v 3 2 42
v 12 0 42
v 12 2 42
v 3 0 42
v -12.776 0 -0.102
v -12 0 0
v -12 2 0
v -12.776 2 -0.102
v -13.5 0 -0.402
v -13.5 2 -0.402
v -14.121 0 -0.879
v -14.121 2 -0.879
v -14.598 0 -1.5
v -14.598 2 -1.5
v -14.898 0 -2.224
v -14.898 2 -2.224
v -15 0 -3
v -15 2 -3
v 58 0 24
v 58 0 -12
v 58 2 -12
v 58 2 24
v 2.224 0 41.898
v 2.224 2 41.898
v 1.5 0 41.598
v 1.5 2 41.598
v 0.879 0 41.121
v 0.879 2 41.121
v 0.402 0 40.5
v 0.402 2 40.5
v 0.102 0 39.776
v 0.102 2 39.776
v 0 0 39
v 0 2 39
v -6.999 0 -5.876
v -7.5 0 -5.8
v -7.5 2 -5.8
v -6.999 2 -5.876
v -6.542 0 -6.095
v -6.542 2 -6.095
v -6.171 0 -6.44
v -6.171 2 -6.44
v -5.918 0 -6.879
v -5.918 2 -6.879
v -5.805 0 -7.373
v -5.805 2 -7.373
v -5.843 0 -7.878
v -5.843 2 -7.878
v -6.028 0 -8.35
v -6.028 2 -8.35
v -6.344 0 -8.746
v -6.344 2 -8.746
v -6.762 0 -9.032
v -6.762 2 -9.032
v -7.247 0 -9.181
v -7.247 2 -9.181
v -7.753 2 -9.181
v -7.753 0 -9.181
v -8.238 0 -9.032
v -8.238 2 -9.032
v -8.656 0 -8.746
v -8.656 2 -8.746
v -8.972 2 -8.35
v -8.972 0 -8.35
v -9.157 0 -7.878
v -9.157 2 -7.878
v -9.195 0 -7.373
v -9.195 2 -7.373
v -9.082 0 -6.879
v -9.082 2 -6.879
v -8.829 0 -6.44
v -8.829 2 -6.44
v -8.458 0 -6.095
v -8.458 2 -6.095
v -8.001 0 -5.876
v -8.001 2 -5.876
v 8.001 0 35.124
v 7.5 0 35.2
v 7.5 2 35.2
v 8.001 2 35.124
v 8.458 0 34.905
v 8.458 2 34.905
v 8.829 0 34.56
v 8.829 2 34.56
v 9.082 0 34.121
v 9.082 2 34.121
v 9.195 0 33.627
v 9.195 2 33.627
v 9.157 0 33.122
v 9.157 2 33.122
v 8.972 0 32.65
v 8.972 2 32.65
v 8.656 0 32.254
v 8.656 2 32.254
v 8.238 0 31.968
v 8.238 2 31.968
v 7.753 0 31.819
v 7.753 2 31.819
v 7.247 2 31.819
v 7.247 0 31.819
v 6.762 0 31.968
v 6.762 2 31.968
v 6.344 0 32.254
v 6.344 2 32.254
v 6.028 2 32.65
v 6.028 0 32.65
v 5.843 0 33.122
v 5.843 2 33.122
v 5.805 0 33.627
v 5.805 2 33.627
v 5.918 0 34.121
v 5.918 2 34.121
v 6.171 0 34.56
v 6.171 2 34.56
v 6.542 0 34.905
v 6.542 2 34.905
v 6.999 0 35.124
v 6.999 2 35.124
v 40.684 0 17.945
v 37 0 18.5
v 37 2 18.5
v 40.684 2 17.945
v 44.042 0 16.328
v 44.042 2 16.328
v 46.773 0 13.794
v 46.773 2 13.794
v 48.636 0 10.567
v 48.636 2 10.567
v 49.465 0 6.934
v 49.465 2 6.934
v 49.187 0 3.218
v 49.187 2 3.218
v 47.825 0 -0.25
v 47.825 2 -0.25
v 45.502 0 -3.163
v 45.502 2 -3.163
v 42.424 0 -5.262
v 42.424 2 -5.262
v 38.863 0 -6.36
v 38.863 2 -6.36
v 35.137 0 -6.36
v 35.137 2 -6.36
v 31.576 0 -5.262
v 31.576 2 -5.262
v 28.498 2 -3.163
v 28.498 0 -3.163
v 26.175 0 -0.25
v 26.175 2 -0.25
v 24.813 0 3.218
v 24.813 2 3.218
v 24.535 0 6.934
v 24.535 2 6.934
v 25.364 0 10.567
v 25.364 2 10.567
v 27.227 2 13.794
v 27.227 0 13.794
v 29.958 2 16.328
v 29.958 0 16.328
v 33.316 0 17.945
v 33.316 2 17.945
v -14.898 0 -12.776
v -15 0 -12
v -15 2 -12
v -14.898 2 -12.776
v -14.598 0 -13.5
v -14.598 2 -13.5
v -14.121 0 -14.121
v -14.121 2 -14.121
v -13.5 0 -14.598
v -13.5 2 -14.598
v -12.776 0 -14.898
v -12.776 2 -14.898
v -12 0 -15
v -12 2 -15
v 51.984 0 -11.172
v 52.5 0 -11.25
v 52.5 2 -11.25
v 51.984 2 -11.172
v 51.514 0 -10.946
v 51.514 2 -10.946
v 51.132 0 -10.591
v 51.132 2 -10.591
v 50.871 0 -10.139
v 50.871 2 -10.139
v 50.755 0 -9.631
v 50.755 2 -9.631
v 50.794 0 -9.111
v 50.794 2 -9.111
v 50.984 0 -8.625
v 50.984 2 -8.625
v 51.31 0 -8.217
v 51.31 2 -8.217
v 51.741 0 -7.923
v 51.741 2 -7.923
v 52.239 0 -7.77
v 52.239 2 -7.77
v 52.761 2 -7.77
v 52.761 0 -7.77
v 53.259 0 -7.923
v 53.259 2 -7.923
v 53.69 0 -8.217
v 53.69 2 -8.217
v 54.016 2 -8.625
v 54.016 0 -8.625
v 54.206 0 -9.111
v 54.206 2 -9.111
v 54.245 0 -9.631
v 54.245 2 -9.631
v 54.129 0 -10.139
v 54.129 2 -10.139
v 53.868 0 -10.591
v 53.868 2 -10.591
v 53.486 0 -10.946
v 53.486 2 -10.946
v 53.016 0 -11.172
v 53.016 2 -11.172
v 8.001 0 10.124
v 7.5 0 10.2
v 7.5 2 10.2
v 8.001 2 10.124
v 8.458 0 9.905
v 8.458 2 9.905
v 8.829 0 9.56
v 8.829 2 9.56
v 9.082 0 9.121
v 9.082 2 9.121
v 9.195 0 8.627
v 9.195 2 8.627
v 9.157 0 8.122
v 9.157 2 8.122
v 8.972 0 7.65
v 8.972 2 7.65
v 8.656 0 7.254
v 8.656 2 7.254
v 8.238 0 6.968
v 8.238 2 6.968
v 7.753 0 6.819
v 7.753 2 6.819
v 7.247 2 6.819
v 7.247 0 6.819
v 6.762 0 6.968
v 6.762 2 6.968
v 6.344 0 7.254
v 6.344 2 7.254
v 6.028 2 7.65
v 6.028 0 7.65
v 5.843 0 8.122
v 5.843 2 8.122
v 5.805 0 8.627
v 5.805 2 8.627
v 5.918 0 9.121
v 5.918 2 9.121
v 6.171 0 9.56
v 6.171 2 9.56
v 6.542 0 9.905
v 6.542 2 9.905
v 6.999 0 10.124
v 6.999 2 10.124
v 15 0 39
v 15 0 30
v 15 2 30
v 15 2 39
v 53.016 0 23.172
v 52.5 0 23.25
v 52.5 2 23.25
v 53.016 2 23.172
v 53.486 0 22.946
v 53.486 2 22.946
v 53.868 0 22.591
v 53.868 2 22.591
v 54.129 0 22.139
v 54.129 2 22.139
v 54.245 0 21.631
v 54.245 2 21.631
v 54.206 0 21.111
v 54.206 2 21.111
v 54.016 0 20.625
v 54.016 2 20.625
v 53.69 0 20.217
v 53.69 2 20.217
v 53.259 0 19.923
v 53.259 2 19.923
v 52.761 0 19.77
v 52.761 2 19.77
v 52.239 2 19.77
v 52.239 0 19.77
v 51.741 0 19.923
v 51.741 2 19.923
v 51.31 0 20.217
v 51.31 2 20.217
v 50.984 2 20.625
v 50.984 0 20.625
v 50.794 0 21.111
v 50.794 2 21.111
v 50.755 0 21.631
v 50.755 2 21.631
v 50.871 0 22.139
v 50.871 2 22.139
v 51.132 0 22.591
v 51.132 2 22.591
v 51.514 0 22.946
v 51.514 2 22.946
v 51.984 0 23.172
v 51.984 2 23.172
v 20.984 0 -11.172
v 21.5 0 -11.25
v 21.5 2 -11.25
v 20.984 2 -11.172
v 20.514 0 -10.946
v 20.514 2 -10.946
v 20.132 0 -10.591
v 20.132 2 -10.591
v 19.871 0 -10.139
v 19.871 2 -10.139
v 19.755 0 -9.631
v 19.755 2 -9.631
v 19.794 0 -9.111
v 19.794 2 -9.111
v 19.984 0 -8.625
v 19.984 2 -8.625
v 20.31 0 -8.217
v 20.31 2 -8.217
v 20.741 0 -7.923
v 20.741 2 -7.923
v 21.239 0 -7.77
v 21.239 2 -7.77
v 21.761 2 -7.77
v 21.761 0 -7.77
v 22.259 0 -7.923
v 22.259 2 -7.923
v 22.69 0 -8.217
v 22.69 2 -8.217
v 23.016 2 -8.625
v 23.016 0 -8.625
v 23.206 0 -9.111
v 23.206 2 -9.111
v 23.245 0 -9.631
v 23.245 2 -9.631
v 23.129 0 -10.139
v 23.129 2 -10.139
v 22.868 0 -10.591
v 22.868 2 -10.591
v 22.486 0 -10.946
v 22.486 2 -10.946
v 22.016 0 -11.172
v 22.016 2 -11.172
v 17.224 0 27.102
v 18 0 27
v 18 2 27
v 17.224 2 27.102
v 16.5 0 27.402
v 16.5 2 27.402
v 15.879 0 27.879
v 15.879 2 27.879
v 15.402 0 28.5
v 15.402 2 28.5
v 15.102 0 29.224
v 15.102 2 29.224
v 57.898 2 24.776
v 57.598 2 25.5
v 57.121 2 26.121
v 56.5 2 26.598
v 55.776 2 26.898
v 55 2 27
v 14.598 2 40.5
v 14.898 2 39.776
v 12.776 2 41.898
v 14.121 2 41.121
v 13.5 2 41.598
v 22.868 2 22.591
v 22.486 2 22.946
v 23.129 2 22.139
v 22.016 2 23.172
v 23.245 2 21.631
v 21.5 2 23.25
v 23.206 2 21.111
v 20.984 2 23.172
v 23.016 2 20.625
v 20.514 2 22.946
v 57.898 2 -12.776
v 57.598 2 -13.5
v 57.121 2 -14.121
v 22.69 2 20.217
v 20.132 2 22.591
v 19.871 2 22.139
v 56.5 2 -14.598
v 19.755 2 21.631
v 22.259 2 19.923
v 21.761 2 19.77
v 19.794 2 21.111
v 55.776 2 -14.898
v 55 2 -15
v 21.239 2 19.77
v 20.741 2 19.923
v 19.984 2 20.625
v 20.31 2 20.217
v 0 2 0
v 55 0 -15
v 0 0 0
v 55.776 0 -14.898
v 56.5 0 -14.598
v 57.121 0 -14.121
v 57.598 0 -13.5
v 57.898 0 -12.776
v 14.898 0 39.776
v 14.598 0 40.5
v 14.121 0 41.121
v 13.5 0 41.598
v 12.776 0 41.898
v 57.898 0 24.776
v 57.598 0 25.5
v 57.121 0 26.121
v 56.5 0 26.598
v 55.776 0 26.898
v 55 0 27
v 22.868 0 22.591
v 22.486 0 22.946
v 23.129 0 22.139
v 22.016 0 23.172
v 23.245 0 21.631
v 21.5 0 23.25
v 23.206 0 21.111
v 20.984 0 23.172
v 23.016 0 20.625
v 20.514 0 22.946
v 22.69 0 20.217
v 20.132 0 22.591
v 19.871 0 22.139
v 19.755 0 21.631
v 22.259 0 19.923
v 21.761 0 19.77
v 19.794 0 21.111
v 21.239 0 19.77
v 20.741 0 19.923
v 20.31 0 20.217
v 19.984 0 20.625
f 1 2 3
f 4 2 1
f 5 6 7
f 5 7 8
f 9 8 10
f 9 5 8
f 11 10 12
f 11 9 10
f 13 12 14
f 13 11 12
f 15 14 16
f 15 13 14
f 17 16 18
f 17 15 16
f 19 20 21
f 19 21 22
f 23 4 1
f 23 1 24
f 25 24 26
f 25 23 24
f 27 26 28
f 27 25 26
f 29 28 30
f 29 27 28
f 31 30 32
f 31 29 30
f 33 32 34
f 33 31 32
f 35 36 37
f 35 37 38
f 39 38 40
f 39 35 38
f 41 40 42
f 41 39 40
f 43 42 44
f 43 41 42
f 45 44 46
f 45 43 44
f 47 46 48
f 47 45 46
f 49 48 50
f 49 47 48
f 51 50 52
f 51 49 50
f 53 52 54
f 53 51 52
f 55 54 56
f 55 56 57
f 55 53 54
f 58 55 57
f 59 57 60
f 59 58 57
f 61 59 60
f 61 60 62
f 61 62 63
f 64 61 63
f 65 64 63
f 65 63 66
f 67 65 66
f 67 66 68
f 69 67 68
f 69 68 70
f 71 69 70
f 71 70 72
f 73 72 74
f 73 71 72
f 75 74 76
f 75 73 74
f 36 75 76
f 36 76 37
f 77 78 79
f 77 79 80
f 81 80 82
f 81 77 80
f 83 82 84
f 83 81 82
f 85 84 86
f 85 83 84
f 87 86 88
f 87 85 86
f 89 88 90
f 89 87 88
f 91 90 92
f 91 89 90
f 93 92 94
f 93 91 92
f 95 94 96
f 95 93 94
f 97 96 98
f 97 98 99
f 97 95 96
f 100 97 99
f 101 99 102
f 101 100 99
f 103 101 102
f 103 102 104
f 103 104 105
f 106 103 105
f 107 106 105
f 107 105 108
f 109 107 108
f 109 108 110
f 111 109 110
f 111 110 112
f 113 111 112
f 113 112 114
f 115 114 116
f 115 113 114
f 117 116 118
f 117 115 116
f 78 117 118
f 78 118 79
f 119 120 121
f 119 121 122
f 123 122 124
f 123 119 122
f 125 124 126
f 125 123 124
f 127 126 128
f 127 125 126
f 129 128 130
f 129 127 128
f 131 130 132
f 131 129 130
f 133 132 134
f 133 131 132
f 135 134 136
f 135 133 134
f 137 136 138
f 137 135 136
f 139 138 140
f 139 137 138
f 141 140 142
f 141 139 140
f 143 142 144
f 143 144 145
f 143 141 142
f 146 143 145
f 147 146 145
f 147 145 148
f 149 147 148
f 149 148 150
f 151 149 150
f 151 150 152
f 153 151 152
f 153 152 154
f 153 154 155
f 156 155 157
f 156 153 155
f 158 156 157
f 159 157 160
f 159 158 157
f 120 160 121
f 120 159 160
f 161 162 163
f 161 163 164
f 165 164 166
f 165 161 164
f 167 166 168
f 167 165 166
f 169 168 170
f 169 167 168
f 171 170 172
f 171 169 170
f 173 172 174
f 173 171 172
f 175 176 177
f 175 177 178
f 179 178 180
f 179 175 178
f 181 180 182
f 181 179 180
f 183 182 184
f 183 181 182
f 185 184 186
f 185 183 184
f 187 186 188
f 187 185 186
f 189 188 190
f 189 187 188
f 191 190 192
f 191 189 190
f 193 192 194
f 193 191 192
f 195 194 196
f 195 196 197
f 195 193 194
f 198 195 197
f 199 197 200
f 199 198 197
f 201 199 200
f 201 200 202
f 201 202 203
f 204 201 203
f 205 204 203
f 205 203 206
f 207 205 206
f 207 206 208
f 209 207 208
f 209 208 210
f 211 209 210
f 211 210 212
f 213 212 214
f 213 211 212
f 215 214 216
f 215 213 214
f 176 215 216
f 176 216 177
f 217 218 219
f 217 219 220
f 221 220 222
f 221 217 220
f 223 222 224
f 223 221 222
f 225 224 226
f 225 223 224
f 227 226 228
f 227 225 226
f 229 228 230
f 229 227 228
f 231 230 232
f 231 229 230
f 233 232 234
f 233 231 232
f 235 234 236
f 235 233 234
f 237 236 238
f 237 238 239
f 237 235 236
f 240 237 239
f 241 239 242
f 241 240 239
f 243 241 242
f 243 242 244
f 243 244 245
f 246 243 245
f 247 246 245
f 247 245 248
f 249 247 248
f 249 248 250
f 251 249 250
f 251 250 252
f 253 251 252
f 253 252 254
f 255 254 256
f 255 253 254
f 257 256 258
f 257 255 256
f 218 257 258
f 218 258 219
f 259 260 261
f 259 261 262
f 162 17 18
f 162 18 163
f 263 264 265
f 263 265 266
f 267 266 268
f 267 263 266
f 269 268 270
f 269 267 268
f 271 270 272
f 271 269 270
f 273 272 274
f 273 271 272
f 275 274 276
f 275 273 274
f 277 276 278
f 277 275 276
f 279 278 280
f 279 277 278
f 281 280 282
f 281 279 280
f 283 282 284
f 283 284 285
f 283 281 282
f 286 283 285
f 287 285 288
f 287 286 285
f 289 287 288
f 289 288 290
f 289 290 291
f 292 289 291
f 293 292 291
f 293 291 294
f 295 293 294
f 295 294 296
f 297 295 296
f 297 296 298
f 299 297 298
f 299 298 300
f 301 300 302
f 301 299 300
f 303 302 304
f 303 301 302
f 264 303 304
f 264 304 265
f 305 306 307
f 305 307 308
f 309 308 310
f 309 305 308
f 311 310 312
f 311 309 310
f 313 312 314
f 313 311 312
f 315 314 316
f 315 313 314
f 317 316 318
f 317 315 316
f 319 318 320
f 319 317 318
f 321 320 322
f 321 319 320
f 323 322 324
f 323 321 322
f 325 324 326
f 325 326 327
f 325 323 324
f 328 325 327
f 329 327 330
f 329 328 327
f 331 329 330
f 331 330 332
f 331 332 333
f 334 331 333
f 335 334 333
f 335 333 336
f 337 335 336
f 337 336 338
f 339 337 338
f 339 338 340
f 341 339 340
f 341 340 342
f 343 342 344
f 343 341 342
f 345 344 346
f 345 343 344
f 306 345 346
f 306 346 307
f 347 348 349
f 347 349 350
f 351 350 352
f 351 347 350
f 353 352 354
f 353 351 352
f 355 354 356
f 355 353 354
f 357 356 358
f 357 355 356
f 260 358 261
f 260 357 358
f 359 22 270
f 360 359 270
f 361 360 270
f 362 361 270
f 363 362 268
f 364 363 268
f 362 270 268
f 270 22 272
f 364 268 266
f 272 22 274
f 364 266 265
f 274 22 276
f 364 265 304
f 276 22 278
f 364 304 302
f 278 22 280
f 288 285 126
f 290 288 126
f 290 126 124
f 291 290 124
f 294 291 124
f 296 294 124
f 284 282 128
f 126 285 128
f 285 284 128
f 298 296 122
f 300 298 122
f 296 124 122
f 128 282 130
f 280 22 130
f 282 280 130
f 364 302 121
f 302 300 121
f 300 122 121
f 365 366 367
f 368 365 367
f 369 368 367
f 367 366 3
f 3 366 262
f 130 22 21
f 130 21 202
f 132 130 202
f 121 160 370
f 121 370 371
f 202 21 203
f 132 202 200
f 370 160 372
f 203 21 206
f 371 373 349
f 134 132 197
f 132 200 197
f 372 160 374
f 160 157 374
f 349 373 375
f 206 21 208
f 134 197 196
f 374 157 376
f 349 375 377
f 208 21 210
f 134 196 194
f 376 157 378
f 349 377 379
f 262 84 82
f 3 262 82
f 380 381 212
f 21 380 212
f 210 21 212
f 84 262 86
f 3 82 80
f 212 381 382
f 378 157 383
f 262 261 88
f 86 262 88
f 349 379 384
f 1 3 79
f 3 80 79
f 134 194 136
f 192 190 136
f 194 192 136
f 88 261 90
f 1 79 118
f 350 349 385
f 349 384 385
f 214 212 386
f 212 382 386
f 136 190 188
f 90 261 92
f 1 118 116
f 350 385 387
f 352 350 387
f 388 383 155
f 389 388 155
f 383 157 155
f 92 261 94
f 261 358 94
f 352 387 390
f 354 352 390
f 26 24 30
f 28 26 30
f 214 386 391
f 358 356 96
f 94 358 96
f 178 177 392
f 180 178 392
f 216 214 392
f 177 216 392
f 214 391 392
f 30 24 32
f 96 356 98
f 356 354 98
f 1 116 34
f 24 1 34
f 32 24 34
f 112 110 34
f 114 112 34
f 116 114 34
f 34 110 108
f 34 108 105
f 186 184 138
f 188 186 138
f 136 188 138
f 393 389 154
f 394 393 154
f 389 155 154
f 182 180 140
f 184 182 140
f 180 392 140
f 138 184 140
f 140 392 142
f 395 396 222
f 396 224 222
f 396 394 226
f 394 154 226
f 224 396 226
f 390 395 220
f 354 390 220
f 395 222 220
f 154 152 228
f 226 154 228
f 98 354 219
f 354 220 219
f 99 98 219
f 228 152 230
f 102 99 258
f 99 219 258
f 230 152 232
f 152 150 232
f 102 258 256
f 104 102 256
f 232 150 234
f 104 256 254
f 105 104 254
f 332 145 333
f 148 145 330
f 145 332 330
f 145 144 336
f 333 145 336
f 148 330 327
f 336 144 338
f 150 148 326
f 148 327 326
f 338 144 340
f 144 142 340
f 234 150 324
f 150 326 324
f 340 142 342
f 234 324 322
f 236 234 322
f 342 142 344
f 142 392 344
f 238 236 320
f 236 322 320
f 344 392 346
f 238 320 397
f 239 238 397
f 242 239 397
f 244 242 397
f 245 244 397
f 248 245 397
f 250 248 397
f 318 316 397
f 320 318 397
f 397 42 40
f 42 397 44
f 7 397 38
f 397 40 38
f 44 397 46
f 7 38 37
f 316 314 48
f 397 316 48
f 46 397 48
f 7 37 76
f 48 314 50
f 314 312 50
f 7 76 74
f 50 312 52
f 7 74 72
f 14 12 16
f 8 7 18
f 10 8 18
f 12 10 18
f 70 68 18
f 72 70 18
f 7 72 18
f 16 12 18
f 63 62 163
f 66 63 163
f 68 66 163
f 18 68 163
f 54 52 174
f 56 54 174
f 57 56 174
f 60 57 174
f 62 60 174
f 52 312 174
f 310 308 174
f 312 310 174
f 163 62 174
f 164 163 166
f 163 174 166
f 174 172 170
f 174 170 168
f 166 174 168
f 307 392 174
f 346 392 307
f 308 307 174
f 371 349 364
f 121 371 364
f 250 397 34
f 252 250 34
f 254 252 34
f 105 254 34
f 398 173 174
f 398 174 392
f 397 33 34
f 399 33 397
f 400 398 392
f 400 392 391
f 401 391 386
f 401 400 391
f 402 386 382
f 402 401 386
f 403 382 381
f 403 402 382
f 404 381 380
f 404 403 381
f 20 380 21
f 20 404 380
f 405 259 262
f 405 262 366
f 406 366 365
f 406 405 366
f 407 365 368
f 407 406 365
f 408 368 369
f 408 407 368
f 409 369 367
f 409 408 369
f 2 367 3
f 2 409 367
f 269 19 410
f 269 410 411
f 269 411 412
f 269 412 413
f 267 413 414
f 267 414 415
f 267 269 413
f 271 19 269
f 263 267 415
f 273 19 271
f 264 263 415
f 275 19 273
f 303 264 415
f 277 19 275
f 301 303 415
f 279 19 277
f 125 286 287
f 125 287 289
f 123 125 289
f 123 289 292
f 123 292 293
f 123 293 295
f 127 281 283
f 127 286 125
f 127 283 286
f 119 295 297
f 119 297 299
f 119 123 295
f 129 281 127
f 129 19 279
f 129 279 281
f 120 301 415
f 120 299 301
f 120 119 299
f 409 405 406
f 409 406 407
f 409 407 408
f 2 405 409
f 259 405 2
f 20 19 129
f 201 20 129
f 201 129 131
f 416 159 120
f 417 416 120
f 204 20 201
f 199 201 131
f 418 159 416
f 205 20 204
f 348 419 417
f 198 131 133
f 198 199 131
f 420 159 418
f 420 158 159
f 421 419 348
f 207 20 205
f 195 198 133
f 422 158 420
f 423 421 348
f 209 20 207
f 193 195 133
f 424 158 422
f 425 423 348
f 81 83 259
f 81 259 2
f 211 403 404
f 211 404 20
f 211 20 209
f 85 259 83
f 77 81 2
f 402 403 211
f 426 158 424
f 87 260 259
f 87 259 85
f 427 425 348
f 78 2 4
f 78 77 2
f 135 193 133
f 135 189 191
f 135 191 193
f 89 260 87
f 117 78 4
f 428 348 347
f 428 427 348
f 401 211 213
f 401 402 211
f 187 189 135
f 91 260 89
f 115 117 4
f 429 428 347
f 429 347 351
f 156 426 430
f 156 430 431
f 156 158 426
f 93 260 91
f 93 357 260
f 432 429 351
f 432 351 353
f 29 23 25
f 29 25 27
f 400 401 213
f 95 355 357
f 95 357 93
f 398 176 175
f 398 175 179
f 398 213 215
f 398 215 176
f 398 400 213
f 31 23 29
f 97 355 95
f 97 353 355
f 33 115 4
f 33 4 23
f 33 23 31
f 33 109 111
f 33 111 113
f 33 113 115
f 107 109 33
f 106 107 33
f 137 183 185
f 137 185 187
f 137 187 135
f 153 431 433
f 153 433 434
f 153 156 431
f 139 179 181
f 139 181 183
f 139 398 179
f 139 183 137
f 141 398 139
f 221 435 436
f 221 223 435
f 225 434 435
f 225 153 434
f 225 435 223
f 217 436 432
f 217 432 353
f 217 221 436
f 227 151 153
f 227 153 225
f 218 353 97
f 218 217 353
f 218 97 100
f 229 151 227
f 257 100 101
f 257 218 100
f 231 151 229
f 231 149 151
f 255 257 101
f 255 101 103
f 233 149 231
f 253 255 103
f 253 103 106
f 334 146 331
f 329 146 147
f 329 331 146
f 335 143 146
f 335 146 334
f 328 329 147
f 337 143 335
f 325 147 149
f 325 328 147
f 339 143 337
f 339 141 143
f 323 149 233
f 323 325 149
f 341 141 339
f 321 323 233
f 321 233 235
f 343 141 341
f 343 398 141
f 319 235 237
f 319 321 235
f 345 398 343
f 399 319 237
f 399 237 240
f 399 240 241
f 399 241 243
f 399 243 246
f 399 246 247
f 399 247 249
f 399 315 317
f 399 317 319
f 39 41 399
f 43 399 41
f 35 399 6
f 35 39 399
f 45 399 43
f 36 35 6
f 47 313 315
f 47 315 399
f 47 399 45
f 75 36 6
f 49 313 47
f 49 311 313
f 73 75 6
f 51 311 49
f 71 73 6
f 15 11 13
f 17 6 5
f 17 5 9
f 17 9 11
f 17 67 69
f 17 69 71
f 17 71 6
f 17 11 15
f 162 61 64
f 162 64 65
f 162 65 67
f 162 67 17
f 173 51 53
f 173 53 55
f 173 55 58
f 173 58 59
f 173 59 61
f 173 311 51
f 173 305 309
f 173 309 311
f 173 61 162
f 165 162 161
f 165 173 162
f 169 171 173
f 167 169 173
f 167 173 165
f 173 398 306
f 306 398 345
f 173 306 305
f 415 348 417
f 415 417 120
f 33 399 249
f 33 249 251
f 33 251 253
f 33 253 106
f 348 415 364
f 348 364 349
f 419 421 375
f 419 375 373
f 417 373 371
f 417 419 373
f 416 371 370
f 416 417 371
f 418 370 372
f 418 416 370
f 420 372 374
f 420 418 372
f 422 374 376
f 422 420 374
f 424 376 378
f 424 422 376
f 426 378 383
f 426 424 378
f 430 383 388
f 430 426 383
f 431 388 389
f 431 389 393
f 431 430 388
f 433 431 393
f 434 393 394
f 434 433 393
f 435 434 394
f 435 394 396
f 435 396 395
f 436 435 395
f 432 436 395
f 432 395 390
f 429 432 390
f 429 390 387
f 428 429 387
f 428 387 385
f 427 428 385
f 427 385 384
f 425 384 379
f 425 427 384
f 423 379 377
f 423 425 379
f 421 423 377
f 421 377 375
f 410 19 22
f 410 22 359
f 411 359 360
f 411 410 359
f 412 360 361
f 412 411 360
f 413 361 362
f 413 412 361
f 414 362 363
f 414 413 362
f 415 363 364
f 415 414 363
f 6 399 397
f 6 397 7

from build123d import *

# Parameters (mm, degrees)
SKETCH_1_R      = 12.5
SKETCH_1_R_2    = 1.75
SKETCH_1_R_3    = 1.7
EXTRUDE_2_DEPTH = 2


with BuildPart() as part:
    # 草图1 → 凸台-拉伸2 (new body)
    with BuildSketch(Plane(origin=(0, 0, 0), x_dir=(1, 0, 0), z_dir=(0, 1, 0))):
        with BuildLine():
            Line((0, 0), (-12, 0))
            ThreePointArc((-12, 0), (-14.121320344, 0.878679656), (-15, 3))
            Line((-15, 3), (-15, 12))
            ThreePointArc((-15, 12), (-14.121320344, 14.121320344), (-12, 15))
            Line((-12, 15), (15, 15))
            Line((15, 15), (55, 15))
            ThreePointArc((55, 15), (57.121320344, 14.121320344), (58, 12))
            Line((58, 12), (58, -24))
            ThreePointArc((58, -24), (57.121320344, -26.121320344), (55, -27))
            Line((55, -27), (18, -27))
            ThreePointArc((18, -27), (15.878679656, -27.878679656), (15, -30))
            Line((15, -30), (15, -39))
            ThreePointArc((15, -39), (14.121320344, -41.121320344), (12, -42))
            Line((12, -42), (3, -42))
            ThreePointArc((3, -42), (0.878679656, -41.121320344), (0, -39))
            Line((0, -39), (0, -32.824659397))
            Line((0, -32.824659397), (0, 0))
        make_face()
        with Locations(Location((37, -6, 0), (0, 0, 270))):
            Circle(SKETCH_1_R, mode=Mode.SUBTRACT)
        with Locations(Location((52.5, -21.5, 0), (0, 0, 270))):
            Circle(SKETCH_1_R_2, mode=Mode.SUBTRACT)
        with Locations(Location((21.5, -21.5, 0), (0, 0, 270))):
            Circle(SKETCH_1_R_2, mode=Mode.SUBTRACT)
        with Locations(Location((21.5, 9.5, 0), (0, 0, 90))):
            Circle(SKETCH_1_R_2, mode=Mode.SUBTRACT)
        with Locations(Location((52.5, 9.5, 0), (0, 0, 90))):
            Circle(SKETCH_1_R_2, mode=Mode.SUBTRACT)
        with Locations(Location((7.5, -8.5, 0), (0, 0, 270))):
            Circle(SKETCH_1_R_3, mode=Mode.SUBTRACT)
        with Locations(Location((7.5, -33.5, 0), (0, 0, 270))):
            Circle(SKETCH_1_R_3, mode=Mode.SUBTRACT)
        with Locations(Location((-7.5, 7.5, 0), (0, 0, 270))):
            Circle(SKETCH_1_R_3, mode=Mode.SUBTRACT)
    extrude(amount=EXTRUDE_2_DEPTH)


solid = part.part
